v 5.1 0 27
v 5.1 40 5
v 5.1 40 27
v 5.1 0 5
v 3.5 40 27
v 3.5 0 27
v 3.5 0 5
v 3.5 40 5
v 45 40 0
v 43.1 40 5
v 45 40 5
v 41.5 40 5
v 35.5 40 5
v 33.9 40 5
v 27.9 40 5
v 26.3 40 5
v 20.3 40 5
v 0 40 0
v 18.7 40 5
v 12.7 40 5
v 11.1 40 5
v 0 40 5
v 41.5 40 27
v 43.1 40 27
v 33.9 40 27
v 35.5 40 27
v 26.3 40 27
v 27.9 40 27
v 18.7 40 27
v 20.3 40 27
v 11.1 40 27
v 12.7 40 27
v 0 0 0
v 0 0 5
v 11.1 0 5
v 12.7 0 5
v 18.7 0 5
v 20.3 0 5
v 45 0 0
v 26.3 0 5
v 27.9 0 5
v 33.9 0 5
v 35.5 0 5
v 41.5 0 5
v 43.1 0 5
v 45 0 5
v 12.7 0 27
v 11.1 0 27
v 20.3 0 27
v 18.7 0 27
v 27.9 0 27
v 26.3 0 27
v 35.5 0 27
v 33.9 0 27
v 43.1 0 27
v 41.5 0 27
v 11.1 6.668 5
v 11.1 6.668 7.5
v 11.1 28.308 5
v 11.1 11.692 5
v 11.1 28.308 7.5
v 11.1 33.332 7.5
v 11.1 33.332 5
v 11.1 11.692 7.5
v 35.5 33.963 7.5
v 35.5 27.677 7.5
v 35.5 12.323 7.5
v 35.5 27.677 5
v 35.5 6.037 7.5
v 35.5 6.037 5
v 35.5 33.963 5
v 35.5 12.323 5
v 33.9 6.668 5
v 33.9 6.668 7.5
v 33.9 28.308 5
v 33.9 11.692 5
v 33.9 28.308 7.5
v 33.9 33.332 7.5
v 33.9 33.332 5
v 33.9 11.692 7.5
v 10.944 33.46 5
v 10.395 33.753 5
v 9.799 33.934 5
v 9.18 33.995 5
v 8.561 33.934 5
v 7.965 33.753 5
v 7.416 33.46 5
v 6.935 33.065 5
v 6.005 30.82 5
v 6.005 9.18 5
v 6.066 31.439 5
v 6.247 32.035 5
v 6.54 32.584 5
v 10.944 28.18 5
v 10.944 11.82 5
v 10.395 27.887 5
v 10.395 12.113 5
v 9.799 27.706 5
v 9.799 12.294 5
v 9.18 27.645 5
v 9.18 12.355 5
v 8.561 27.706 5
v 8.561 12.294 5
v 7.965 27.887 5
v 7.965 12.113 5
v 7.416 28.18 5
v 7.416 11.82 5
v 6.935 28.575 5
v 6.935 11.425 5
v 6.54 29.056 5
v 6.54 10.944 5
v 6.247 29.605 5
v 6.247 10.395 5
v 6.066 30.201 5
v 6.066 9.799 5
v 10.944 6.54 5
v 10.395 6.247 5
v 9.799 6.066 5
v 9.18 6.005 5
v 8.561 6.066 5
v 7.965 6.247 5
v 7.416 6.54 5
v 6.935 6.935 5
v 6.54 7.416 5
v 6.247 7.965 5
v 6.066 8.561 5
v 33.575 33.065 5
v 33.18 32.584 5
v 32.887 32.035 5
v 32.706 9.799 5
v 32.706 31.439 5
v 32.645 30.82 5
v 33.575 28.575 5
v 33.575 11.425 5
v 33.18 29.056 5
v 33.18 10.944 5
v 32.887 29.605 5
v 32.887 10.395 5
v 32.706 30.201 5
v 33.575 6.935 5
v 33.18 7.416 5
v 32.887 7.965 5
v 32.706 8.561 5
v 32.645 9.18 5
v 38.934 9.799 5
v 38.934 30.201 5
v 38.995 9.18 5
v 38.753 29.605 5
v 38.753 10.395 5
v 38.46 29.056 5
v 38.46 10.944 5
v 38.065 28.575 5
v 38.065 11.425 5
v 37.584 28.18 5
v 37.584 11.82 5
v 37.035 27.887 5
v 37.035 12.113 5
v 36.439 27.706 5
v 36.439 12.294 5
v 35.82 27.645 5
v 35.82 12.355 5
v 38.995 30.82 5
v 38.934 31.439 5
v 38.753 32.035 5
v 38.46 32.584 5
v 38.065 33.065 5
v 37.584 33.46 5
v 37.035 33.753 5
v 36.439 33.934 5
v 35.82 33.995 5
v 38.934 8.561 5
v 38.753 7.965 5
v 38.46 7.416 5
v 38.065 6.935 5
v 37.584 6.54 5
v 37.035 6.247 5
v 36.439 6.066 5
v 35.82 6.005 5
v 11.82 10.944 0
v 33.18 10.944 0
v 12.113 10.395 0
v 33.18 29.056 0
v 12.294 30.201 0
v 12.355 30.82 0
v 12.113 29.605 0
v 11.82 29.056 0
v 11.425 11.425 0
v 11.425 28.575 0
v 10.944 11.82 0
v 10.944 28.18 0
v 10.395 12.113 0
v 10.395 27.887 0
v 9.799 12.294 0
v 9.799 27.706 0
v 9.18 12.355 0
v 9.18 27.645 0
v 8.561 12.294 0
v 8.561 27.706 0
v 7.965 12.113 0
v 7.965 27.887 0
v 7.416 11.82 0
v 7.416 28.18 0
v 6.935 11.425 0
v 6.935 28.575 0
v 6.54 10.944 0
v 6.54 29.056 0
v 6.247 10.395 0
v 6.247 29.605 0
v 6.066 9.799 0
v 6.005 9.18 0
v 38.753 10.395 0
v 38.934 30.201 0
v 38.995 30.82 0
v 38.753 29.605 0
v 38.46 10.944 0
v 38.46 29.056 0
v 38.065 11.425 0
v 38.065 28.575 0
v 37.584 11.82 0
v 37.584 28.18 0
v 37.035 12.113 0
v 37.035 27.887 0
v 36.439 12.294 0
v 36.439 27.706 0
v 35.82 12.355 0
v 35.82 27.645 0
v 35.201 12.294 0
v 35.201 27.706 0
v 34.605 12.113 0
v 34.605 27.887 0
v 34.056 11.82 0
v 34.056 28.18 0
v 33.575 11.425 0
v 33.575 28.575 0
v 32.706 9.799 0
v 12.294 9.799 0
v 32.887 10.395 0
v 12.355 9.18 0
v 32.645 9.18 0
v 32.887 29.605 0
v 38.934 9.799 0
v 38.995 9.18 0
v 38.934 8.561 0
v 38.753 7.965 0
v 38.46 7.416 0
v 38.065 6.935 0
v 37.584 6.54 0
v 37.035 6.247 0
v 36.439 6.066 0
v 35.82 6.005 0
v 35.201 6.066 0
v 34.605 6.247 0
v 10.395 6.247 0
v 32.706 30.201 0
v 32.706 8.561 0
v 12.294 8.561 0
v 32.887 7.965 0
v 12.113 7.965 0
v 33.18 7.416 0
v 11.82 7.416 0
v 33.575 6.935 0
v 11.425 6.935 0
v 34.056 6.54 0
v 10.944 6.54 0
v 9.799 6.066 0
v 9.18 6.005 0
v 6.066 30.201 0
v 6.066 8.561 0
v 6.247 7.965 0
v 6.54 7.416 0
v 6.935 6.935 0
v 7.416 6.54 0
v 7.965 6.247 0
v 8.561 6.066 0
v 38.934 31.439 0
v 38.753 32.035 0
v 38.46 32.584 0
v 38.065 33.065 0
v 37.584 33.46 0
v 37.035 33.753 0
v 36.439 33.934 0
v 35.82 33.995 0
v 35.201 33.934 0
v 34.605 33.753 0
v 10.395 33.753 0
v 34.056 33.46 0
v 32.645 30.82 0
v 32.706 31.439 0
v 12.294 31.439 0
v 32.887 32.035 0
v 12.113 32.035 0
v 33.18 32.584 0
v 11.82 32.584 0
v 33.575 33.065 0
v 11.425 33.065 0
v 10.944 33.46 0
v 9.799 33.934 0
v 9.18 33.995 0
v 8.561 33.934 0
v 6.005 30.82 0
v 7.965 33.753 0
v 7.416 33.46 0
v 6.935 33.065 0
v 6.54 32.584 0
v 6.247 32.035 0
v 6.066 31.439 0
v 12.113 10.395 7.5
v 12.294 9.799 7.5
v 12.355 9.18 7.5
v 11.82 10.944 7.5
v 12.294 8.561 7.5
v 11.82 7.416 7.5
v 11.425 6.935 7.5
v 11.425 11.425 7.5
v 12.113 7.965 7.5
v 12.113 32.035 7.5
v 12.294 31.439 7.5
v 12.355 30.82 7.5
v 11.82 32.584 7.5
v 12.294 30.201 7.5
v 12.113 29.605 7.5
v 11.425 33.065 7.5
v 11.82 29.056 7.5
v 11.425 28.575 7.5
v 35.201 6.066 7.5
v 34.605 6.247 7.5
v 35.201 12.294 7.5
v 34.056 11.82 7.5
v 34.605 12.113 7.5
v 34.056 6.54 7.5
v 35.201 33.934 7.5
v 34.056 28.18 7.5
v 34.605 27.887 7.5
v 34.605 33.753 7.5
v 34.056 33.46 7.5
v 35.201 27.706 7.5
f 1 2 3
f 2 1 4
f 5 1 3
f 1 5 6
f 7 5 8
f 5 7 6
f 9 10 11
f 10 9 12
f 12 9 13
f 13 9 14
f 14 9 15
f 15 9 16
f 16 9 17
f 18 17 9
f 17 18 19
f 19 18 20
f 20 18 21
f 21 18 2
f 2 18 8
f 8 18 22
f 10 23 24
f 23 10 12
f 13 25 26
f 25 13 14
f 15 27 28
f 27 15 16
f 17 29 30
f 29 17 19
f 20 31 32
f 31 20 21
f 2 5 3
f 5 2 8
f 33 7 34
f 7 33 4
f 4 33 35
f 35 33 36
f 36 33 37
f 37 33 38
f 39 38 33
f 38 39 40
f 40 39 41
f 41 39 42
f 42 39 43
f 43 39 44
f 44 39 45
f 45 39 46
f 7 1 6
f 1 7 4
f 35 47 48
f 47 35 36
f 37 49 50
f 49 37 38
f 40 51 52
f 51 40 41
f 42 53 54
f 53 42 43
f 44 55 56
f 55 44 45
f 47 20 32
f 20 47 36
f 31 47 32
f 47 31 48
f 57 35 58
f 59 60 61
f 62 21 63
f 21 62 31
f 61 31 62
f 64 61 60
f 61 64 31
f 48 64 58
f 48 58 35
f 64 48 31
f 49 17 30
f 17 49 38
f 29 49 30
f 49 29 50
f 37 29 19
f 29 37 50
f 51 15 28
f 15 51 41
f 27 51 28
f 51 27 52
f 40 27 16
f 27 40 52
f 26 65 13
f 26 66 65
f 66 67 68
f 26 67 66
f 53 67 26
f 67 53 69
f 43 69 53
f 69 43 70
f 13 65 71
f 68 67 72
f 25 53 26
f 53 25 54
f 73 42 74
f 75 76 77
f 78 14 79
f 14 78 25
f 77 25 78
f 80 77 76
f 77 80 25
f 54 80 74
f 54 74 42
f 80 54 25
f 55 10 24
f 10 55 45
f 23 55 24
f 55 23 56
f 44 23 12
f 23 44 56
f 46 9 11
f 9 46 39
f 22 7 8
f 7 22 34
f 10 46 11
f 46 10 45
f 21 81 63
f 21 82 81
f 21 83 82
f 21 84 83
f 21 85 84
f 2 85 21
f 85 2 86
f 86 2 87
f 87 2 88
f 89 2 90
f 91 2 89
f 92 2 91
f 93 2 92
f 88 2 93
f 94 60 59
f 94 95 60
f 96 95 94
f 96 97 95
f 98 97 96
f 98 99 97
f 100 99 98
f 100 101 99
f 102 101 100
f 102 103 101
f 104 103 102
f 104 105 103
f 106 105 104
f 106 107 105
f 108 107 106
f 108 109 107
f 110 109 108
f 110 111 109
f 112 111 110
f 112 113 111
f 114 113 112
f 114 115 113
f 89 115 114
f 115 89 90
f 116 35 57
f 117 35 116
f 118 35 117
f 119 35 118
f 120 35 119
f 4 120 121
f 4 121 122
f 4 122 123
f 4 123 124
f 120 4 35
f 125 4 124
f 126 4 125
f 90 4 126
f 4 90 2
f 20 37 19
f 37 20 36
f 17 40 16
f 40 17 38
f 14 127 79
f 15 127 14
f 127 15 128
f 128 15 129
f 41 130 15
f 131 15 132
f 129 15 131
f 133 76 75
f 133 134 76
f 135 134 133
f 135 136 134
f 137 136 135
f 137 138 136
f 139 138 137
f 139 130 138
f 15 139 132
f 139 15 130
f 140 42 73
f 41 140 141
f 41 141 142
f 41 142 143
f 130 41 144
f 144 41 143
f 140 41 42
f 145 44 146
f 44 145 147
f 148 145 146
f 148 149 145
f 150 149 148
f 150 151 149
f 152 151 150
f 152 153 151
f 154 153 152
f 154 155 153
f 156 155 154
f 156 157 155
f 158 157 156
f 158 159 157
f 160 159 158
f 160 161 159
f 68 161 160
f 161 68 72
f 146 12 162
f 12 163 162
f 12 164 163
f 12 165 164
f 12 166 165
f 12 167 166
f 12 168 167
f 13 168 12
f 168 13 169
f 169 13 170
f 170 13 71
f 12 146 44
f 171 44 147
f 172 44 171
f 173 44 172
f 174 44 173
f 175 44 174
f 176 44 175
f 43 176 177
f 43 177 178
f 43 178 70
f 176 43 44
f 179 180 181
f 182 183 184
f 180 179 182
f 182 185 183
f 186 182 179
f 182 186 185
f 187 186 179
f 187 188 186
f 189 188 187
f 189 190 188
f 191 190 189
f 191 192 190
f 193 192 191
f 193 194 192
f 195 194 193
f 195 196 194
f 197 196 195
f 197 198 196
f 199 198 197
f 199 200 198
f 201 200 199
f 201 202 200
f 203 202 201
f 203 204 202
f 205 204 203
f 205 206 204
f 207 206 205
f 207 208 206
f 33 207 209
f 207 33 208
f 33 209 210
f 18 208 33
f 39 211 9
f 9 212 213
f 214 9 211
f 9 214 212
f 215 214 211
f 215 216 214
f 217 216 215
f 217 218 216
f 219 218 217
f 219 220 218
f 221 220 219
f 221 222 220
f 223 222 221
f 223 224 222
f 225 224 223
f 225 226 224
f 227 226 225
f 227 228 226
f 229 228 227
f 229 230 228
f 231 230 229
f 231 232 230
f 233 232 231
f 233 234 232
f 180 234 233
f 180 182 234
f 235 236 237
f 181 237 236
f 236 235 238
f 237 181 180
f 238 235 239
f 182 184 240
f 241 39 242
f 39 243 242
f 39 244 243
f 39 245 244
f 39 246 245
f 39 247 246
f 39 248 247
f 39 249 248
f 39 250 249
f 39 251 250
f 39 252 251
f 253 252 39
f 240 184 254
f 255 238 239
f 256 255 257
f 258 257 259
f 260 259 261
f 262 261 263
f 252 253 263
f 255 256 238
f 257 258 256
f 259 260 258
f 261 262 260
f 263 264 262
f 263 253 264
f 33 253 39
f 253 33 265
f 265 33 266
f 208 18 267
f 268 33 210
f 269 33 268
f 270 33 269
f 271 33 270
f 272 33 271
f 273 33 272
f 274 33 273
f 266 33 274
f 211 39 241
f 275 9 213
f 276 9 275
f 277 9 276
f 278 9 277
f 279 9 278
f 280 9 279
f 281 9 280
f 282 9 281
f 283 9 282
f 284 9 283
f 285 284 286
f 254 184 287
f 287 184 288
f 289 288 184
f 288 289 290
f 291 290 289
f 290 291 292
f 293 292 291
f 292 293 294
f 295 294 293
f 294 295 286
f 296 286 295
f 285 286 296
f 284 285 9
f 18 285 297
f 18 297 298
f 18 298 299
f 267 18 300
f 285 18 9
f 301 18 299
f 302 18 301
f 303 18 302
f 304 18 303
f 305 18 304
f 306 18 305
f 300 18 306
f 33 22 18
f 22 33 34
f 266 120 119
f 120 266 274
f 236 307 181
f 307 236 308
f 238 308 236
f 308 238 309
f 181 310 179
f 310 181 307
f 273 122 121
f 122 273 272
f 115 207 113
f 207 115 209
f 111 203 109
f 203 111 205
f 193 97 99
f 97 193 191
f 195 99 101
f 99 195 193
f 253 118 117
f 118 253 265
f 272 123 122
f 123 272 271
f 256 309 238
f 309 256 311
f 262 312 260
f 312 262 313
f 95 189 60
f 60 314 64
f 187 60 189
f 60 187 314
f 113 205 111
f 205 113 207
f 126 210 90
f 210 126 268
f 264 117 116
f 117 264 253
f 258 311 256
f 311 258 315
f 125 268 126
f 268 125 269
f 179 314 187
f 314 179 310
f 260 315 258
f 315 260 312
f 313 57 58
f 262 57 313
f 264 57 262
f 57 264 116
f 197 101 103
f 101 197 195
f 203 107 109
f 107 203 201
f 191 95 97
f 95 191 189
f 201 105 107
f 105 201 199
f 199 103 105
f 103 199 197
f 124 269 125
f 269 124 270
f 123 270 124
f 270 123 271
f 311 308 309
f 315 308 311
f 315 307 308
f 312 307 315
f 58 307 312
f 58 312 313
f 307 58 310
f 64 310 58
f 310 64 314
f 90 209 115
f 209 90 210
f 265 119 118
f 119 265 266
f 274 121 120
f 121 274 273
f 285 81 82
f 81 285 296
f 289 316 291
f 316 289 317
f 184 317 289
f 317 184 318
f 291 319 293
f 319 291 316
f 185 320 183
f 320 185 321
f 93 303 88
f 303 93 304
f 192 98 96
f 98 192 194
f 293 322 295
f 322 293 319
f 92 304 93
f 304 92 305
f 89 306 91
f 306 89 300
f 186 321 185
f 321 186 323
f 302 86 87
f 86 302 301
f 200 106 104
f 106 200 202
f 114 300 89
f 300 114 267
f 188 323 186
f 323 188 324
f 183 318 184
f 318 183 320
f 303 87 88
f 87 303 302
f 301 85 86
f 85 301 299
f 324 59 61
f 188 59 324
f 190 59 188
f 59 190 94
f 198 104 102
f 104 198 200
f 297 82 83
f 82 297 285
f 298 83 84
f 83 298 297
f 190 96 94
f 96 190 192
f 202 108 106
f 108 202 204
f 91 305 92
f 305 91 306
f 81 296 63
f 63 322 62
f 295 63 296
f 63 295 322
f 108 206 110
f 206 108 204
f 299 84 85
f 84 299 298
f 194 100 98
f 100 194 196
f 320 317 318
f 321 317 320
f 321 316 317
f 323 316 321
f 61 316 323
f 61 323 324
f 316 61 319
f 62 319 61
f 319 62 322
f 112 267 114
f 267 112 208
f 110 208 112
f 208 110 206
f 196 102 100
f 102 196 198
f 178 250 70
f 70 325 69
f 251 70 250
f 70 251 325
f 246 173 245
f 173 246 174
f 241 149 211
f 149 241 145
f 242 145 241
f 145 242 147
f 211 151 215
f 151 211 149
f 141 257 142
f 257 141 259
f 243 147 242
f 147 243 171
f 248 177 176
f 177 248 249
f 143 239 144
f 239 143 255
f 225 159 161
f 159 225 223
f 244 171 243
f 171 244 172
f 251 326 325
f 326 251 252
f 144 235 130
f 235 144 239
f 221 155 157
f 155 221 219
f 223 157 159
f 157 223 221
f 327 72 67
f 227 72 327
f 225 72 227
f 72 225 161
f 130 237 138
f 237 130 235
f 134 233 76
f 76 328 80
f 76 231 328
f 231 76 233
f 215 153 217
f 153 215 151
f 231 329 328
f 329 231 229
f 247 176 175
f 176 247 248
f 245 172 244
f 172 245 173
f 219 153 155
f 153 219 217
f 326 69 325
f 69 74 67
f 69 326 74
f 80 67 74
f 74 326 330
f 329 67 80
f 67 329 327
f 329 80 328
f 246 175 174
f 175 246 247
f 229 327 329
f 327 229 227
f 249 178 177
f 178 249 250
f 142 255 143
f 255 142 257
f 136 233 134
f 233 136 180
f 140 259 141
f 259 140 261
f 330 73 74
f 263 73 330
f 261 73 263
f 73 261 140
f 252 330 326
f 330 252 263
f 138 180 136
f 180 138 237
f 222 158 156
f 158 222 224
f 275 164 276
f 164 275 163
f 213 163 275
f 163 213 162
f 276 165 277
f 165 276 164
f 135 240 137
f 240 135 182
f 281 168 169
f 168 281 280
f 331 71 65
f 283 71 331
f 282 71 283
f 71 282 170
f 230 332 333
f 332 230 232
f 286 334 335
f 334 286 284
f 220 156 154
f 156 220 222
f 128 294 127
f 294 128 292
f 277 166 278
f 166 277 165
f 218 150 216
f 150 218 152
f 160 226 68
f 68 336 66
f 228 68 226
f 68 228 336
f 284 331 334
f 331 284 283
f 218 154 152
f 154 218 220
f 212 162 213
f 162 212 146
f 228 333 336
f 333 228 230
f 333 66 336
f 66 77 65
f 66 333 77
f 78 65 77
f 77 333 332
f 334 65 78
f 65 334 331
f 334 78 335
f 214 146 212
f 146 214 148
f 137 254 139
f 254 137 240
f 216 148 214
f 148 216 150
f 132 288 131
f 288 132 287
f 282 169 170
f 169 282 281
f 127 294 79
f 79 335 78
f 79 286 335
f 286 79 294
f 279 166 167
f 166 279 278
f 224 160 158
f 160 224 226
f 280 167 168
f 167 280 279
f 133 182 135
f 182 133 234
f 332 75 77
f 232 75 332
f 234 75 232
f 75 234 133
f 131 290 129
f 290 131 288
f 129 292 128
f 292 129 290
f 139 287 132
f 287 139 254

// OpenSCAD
$fn = 32;

// ----------------------------------------------------------------------
// Finned heat sink: 45 x 40 mm base, 22 mm fins
// ----------------------------------------------------------------------

// --- parameters (mm) ---
base_w = 45;              // base width
base_d = 40;              // base depth
base_t = 5;               // base thickness
fin_h = 22;               // fin height above the base
holes_d = 6.35;           // fixing holes
hole_x = 13.32;           // hole offset in x
hole_y = 10.82;           // hole offset in y
fin_t = 1.6;              // fin thickness
fin_pitch = 7.6;          // fin pitch
fin_count = 6;            // number of fins
fin_x0 = 3.5;             // first fin offset

difference() {
  union() {
    cube([base_w, base_d, base_t]);
    for (i = [0 : fin_count - 1]) {
      translate([fin_x0 + i * fin_pitch, 0, base_t - 0.5]) cube([fin_t, base_d, fin_h + 0.5]);
    }
  }
  /* fixing holes through the base, 2.5 mm clear on both sides */
  for (hx = [-13.32, 13.32]) {
    for (hy = [-10.82, 10.82]) {
      translate([base_w / 2 + hx, base_d / 2 + hy, -2.5]) cylinder(h = base_t + 5, d = holes_d);
    }
  }
}
